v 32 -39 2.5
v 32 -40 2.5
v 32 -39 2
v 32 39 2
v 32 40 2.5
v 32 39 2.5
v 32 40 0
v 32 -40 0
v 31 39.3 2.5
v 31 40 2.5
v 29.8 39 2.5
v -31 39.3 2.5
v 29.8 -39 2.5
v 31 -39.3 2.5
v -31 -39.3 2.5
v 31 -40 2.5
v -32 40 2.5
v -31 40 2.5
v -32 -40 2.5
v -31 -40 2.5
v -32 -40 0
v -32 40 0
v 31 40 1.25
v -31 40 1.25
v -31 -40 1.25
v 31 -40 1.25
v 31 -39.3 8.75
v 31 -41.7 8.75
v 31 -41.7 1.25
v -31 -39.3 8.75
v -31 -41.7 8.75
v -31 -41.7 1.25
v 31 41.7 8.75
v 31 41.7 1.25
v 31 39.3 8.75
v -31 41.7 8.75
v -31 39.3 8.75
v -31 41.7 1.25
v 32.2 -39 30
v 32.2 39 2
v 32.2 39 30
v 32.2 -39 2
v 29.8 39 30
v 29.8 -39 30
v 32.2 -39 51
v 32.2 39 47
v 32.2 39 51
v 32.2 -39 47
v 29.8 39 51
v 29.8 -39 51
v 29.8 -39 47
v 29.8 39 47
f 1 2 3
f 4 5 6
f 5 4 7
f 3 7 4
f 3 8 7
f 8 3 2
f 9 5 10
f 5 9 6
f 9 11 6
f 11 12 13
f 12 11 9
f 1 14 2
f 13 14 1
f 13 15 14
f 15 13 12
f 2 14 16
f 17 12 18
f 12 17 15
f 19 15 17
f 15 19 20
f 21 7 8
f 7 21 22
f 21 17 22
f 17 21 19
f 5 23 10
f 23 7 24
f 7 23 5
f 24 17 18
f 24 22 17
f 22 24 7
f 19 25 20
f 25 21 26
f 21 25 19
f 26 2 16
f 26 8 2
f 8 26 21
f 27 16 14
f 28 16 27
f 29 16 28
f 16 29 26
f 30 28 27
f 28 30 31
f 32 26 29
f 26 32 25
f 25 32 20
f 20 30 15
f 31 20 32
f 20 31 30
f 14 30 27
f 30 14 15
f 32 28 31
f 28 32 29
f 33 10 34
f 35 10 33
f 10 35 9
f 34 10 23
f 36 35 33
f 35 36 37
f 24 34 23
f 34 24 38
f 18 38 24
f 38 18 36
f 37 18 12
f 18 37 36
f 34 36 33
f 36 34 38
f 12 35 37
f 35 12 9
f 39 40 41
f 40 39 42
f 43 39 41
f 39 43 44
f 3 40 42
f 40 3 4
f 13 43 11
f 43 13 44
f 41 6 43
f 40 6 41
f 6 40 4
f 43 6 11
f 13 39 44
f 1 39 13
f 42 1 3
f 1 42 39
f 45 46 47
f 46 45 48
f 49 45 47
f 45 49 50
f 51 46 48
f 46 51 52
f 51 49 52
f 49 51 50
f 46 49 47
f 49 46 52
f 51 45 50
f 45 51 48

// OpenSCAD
// Smart Desktop Cube modular insert v1
// Units: mm. Axis: X=depth, Y=width, Z=height.
// Original mzh51.stl bounds measured approximately 70.4 x 87.5 x 86.7 mm.
// This insert is intentionally smaller: about 72 x 85 x 90 including tabs, trim parameters after test print.

$fn = 32;
module box(c, s) { translate(c) cube(s, center=true); }
module tube_z(c, ro, ri, h) { translate(c) difference(){ cylinder(h=h, r=ro, center=true); cylinder(h=h+0.2, r=ri, center=true); } }

// Main dimensions
base_depth = 64;
base_width = 80;
base_thickness = 2.5;

// Recommended module assumptions:
// ESP32-S3 DevKitM-1: 55 x 28 mm, M2/M2.3 pilot holes or zip ties.
// ILI9341 2.4 touch display board: about 77 x 42 mm, mounted on front Y-Z plane.
// AHT21 / ENS160 / BH1750: small breakout boards in top rear slide slots.
// LD2410B: front/top bay, keep antenna side exposed, avoid metal screws in front.

union(){
  box([0,0,1.25], [64,80,2.5]);
  box([0,-40.5,5], [62,2.4,7.5]);
  box([0,40.5,5], [62,2.4,7.5]);
  box([31,0,16], [2.4,78,28]);
  box([31,0,49], [2.4,78,4]);
  // Add/edit detailed rails in STL generator script for now.
}
